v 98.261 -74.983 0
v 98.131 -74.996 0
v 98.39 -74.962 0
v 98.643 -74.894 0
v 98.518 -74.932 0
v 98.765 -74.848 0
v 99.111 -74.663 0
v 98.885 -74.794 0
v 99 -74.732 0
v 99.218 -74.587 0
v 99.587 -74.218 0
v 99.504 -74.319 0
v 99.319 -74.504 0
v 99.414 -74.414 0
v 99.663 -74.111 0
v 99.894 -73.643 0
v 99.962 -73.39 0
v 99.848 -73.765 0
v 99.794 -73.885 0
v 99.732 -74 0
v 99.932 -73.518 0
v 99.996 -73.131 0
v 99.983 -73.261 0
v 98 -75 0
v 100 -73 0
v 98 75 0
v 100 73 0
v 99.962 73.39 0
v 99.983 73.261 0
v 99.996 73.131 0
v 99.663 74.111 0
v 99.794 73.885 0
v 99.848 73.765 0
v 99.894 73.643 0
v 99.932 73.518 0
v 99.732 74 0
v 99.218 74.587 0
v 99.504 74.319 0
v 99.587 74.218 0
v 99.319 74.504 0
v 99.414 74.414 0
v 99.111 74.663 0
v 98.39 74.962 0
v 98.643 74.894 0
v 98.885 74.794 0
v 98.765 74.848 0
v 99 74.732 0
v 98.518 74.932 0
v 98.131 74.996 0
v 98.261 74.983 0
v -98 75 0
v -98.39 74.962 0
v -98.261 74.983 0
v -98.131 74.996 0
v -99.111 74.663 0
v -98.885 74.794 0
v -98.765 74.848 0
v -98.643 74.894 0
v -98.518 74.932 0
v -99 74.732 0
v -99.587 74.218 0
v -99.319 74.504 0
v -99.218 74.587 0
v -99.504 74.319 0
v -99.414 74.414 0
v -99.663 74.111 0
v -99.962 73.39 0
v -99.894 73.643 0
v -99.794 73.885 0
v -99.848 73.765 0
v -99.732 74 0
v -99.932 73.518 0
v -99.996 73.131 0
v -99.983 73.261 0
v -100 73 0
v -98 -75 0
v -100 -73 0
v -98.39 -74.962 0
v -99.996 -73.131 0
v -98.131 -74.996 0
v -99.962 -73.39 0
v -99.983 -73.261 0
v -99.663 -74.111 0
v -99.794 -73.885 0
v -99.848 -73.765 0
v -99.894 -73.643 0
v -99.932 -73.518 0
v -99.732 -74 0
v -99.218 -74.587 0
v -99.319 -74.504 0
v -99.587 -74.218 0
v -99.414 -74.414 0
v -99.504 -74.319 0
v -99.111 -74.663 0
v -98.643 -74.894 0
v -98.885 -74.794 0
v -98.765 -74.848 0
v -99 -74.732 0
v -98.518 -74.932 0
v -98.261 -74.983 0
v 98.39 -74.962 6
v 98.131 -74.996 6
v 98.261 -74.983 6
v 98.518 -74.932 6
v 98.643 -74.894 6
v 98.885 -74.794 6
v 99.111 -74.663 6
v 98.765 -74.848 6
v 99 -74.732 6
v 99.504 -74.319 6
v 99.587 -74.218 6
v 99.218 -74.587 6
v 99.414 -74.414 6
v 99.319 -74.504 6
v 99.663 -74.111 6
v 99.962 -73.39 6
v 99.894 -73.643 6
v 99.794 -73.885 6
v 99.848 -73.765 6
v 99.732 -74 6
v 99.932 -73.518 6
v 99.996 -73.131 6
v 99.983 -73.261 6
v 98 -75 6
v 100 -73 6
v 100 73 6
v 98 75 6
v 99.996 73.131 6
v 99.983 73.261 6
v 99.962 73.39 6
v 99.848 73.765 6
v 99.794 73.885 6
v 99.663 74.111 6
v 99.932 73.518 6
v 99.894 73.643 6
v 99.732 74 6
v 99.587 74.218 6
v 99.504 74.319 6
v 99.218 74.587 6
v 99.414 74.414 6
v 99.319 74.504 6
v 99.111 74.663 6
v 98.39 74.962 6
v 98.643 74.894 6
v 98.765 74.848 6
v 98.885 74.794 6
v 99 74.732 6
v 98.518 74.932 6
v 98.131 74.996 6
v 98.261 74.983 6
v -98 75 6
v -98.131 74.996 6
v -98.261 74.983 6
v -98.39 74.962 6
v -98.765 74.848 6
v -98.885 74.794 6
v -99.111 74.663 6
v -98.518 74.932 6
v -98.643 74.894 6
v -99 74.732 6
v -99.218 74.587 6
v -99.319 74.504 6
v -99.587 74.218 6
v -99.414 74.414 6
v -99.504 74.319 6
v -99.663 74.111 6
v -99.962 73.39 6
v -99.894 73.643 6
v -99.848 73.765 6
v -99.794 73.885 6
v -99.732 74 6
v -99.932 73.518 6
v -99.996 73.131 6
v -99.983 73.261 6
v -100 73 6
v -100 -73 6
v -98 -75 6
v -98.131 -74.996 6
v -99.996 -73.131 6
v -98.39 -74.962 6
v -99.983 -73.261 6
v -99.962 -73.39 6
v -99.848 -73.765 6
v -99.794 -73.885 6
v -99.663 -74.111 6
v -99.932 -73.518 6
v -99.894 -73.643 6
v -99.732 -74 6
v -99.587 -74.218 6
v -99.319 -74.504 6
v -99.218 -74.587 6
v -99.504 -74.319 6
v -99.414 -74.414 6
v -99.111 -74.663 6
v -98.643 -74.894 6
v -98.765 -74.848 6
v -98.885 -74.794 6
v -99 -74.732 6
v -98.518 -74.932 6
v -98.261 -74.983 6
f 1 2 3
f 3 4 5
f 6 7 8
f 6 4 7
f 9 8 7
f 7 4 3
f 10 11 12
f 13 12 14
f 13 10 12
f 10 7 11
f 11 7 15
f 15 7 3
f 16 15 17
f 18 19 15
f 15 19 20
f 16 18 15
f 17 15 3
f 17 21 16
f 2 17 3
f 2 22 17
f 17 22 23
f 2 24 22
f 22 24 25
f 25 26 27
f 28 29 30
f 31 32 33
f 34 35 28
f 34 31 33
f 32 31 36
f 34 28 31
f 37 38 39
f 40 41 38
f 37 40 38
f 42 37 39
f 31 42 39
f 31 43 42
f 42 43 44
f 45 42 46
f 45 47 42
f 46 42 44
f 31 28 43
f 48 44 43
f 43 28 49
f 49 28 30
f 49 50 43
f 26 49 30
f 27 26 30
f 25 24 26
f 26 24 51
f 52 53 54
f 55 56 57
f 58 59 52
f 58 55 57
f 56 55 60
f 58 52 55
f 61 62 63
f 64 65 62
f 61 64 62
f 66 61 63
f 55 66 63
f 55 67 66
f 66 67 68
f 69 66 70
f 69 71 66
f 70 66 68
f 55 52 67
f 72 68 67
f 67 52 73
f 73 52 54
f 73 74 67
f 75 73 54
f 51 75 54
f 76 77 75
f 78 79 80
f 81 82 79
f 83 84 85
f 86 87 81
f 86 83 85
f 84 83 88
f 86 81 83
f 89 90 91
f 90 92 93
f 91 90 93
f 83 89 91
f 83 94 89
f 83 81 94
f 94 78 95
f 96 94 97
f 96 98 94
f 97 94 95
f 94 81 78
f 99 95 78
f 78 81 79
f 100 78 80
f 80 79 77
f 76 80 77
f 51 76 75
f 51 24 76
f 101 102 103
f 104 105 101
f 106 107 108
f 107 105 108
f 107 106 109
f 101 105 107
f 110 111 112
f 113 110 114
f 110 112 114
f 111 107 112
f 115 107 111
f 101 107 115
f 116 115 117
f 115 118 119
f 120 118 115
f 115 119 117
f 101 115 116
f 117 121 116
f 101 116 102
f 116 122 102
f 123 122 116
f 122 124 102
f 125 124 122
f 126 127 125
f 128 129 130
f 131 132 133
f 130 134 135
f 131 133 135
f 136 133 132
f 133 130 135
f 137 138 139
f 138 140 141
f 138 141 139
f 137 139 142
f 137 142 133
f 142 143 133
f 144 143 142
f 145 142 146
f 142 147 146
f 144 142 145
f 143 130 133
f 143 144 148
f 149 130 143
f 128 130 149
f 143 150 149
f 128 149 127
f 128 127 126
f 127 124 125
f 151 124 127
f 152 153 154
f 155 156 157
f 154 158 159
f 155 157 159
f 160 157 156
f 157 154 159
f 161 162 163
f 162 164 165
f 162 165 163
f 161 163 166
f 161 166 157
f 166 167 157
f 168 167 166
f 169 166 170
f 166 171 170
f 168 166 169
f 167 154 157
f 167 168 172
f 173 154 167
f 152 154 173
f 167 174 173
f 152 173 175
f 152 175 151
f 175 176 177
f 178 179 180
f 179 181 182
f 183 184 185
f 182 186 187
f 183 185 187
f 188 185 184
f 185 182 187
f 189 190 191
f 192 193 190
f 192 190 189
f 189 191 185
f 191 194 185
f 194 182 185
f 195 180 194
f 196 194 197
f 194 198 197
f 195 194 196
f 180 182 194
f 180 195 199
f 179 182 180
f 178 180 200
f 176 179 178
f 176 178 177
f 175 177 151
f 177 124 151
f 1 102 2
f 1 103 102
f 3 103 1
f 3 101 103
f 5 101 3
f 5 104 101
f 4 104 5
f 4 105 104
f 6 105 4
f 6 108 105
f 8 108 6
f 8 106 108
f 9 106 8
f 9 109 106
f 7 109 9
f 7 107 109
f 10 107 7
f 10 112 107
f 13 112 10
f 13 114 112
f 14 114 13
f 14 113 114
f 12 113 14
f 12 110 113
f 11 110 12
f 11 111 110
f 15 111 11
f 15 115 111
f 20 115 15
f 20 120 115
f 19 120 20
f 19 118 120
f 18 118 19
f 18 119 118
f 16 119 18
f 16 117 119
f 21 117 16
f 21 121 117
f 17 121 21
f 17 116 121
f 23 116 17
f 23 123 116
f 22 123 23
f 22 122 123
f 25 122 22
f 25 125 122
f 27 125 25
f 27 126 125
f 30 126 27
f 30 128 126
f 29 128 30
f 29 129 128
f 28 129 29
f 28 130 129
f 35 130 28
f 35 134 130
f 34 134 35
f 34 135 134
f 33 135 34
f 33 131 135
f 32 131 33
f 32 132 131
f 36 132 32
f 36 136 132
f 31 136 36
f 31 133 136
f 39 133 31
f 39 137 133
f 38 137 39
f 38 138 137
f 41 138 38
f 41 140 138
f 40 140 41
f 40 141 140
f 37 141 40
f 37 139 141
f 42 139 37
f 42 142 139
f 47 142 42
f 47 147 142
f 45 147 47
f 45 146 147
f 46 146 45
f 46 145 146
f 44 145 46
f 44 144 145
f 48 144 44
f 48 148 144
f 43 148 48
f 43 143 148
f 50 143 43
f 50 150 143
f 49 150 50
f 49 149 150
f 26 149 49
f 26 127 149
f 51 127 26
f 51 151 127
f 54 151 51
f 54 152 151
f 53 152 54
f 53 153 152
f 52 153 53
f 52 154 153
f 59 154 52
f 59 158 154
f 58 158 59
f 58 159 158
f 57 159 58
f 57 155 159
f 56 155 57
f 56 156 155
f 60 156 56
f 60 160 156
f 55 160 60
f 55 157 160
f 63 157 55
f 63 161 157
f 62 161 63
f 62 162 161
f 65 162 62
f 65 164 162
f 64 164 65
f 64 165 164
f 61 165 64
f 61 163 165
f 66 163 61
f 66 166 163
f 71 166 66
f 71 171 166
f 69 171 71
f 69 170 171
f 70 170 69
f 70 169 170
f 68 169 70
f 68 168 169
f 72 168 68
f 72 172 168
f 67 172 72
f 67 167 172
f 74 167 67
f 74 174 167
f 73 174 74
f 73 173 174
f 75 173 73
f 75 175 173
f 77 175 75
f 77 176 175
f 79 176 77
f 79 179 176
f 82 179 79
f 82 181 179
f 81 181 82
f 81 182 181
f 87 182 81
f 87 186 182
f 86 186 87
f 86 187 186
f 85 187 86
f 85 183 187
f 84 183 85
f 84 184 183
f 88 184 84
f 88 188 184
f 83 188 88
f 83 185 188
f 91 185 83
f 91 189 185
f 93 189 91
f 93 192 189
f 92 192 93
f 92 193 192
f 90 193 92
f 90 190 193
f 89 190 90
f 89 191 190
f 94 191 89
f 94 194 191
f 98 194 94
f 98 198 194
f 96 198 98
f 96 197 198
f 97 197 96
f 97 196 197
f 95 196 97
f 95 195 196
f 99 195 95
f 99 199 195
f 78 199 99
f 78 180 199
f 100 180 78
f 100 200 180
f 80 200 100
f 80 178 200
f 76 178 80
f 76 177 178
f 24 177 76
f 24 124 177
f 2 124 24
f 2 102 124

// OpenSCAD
$fn = 96;

length = 200;
width  = 150;
thickness = 6;

module tooling_plate(l=200, w=150, t=6, corner_r=2) {
    color([0.75, 0.78, 0.82])
    linear_extrude(height=t)
        offset(r=corner_r)
            square([l - 2*corner_r, w - 2*corner_r], center=true);
}

tooling_plate(length, width, thickness, corner_r=2);
